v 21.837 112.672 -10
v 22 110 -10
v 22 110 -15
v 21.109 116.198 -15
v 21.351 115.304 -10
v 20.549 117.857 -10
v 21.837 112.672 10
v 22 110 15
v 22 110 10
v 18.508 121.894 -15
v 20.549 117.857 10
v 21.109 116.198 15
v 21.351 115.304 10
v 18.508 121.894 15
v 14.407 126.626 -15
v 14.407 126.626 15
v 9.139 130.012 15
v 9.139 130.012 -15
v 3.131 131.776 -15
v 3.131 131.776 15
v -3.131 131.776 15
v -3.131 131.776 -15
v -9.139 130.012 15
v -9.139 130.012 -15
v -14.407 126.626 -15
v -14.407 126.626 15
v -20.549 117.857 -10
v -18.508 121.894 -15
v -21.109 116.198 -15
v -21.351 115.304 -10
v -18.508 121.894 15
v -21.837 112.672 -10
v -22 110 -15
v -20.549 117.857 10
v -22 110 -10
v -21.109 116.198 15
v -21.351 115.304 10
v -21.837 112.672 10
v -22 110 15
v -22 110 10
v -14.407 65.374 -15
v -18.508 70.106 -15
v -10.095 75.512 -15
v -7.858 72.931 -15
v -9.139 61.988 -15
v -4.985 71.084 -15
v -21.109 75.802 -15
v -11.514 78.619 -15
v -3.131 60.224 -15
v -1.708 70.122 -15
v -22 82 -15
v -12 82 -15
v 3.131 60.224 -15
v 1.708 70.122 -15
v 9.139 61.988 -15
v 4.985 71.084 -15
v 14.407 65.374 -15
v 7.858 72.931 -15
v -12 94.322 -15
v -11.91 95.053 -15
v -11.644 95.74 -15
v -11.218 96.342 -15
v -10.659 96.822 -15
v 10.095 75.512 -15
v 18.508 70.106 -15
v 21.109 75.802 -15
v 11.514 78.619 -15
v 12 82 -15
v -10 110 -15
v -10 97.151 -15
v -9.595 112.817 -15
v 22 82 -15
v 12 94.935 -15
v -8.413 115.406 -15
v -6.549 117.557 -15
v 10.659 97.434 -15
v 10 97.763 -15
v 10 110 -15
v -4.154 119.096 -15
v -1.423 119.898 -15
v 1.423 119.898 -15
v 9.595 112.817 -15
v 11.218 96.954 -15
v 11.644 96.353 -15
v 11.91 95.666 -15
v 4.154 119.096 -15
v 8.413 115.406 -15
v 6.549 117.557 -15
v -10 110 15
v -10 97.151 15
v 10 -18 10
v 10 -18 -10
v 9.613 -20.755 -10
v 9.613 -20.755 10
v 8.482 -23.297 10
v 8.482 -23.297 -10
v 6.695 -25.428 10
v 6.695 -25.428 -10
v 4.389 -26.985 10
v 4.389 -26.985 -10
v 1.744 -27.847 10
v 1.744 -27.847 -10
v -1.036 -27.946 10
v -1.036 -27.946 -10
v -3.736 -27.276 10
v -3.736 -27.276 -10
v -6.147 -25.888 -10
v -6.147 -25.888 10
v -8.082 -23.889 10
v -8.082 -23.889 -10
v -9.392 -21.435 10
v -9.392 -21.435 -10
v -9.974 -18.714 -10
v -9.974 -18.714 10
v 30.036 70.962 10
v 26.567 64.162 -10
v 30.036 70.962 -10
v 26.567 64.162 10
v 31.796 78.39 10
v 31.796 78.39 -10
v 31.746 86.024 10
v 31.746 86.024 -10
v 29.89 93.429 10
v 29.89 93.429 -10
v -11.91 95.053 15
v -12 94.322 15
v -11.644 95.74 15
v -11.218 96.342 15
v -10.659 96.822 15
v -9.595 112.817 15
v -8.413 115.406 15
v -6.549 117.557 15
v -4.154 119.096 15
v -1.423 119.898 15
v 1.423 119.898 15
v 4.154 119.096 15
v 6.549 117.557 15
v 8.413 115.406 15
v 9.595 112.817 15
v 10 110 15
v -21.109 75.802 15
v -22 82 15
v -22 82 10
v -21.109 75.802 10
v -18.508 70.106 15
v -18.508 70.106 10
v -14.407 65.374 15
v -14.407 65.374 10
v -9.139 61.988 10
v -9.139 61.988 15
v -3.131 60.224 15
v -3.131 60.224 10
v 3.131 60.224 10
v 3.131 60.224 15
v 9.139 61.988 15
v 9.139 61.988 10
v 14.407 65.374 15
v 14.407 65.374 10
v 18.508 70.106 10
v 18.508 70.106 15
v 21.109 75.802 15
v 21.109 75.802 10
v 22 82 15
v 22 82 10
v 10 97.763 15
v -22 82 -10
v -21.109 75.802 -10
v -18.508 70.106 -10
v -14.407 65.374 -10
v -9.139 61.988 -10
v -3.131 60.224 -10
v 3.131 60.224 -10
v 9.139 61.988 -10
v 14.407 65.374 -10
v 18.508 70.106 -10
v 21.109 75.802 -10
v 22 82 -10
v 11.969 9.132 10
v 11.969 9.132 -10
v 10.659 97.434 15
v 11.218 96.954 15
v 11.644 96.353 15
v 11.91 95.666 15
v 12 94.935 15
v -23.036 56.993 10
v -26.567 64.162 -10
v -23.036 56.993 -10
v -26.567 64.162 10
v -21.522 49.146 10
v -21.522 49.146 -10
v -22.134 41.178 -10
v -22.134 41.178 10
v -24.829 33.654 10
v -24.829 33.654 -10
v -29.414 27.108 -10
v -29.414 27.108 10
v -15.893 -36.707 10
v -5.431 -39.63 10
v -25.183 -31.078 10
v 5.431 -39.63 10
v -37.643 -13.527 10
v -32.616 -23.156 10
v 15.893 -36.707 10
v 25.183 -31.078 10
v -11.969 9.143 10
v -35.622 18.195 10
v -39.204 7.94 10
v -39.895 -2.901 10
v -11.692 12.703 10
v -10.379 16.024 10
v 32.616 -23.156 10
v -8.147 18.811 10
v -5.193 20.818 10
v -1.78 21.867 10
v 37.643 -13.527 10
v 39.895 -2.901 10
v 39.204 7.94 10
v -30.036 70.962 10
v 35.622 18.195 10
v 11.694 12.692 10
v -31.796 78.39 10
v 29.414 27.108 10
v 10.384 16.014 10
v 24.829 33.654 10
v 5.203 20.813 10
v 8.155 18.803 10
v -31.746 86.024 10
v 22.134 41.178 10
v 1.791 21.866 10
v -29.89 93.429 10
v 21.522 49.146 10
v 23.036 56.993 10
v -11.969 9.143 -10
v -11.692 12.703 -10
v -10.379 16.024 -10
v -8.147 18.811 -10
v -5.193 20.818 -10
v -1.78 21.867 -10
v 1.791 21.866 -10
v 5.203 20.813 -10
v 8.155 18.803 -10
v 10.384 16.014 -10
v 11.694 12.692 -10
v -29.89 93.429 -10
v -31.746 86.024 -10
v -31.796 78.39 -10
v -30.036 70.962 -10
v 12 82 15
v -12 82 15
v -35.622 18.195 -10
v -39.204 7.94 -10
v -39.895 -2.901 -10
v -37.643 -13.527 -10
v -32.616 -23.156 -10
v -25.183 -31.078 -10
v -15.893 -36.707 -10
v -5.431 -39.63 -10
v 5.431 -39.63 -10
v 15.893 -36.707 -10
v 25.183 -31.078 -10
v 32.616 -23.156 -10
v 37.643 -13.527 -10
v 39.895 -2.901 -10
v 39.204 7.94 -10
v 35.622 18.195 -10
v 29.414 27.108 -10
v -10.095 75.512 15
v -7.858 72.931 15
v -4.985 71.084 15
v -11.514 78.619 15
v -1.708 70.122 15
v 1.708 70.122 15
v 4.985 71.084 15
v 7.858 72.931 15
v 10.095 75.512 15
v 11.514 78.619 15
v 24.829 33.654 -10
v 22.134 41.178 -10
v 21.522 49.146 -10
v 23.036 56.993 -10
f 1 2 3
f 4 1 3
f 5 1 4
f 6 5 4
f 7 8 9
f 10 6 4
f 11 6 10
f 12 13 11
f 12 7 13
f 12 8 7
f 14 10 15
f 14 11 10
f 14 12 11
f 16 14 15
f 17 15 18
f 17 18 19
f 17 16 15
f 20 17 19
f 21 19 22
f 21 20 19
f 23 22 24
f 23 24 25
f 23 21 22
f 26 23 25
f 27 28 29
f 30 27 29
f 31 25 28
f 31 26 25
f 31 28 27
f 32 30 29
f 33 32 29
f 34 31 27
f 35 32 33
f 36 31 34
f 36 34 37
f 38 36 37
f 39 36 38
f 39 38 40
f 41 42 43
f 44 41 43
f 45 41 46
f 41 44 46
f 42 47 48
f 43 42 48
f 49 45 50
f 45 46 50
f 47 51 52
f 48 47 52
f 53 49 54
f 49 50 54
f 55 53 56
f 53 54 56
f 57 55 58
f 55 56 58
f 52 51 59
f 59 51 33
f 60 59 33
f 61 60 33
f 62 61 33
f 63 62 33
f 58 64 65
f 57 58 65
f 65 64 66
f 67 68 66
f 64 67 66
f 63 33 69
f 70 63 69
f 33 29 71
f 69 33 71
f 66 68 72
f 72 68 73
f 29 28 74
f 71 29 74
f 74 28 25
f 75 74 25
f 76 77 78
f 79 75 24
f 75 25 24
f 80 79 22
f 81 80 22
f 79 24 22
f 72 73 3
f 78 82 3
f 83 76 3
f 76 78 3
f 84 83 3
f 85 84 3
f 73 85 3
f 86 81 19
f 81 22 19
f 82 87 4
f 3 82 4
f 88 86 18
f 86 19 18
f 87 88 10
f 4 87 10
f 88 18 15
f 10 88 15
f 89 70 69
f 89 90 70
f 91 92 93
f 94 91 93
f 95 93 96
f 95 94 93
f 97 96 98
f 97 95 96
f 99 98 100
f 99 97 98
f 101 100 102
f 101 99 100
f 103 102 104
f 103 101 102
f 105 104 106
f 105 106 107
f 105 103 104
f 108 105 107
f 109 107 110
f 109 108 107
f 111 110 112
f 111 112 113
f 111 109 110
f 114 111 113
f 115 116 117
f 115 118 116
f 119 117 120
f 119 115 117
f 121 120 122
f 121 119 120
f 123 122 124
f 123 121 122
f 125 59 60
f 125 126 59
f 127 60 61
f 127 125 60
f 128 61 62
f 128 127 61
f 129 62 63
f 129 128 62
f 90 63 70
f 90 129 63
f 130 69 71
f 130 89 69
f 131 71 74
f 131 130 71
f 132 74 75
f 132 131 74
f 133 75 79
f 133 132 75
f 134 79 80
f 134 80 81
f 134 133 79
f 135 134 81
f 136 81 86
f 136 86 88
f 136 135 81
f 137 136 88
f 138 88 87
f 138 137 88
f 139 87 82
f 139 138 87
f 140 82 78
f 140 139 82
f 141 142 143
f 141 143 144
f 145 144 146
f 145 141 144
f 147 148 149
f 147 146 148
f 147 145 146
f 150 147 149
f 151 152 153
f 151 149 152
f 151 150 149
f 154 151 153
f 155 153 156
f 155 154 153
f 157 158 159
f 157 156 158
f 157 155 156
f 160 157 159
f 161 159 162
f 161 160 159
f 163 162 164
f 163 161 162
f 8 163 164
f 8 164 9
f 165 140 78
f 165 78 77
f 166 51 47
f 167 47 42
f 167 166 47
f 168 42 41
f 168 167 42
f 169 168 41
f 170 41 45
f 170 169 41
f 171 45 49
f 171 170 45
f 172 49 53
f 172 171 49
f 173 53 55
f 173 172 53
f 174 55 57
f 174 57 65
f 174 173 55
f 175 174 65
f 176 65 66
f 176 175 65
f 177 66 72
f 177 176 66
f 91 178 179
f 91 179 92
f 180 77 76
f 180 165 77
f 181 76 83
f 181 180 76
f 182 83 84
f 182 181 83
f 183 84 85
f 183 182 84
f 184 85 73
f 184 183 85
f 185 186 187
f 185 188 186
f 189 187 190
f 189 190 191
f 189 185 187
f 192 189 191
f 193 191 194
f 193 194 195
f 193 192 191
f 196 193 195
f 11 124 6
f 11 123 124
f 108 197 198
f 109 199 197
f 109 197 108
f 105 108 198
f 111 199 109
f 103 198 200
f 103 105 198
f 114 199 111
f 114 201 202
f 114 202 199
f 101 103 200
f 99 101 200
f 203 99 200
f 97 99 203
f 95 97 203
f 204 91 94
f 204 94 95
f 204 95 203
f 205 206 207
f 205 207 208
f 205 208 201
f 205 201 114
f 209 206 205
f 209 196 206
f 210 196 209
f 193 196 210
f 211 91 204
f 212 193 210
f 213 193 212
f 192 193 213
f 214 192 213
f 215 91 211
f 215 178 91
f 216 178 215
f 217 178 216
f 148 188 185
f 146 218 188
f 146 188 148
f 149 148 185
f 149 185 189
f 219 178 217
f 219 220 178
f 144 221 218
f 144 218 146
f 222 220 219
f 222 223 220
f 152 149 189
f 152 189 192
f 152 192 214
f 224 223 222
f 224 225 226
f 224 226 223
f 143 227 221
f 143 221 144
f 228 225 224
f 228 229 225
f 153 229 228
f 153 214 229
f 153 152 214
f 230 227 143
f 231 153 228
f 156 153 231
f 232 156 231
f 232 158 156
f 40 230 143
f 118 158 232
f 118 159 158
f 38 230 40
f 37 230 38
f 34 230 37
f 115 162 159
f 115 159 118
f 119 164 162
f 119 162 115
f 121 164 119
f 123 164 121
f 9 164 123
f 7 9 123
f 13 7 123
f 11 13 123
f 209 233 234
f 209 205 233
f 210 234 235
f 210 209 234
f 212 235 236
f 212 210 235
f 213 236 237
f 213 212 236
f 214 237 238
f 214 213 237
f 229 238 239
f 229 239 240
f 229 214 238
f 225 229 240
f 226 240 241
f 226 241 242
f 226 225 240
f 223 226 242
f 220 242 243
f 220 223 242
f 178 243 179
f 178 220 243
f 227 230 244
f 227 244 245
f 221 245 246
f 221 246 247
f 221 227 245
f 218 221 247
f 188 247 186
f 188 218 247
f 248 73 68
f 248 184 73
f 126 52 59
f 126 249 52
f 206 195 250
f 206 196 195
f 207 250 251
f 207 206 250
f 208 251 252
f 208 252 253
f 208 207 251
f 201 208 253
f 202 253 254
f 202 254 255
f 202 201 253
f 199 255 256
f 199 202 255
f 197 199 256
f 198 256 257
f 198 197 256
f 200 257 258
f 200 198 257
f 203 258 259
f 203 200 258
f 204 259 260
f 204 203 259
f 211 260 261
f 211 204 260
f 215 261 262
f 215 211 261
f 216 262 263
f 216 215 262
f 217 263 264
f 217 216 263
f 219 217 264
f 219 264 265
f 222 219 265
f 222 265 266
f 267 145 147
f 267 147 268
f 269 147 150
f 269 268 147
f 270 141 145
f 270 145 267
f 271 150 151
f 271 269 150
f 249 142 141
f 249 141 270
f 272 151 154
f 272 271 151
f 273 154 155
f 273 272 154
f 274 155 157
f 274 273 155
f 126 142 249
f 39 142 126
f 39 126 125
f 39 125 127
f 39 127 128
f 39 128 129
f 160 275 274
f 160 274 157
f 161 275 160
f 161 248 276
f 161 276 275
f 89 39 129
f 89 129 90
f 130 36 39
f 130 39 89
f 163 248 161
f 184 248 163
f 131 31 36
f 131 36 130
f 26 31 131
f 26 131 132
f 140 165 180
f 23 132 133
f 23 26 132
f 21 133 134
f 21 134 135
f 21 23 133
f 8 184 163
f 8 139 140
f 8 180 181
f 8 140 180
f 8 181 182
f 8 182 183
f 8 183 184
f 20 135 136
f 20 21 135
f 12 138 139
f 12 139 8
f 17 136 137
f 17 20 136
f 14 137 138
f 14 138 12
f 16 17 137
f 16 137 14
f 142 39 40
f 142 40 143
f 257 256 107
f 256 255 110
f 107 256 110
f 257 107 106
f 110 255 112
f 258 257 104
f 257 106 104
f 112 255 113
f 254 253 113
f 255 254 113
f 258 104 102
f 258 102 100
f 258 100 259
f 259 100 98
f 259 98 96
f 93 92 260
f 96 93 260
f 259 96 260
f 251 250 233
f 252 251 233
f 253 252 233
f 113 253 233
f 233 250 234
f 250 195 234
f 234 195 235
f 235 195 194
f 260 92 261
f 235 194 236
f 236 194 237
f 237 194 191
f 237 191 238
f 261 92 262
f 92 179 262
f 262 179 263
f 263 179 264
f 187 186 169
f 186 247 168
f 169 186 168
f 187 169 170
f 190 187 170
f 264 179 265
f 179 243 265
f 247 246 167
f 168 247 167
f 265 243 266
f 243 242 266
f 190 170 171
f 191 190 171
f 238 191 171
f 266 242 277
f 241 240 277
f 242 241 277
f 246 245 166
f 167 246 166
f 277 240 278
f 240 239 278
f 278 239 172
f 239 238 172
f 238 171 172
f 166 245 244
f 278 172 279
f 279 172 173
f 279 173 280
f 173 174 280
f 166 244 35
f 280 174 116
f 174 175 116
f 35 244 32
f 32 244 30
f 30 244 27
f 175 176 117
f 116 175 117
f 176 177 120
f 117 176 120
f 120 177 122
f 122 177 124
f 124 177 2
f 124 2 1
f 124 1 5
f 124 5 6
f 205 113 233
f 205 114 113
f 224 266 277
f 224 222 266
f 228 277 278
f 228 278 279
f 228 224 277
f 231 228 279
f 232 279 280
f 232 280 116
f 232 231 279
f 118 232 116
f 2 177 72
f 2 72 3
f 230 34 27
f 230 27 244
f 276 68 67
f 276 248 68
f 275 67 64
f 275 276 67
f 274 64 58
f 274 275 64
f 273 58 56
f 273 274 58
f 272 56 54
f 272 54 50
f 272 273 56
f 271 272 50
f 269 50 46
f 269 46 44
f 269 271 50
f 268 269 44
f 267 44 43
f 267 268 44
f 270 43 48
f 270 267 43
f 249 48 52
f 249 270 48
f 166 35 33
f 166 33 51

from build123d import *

# Parameters (mm, degrees)
BOSS_EXTRUDE1_DEPTH = 15
BOSS_EXTRUDE3_DEPTH = 10


with BuildPart() as part:
    # Sketch1 → Boss-Extrude1 (new, symmetric)
    with BuildSketch(Plane.XY):
        with BuildLine():
            Line((22, 82), (22, 110))
            ThreePointArc((22, 110), (21.634233178, 113.994991212), (20.54909502, 117.857142857))
            ThreePointArc((20.54909502, 117.857142857), (0, 132), (-20.54909502, 117.857142857))
            ThreePointArc((-20.54909502, 117.857142857), (-21.634233178, 113.994991212), (-22, 110))
            Line((-22, 110), (-22, 82))
            ThreePointArc((-22, 82), (0, 60), (22, 82))
        make_face()
        with BuildLine():
            ThreePointArc((-10, 110), (0, 120), (10, 110))
            Line((10, 110), (10, 97.763084363))
            ThreePointArc((10, 97.763084363), (11.449489743, 96.666708046), (12, 94.934657238))
            Line((12, 94.934657238), (12, 82))
            ThreePointArc((12, 82), (0, 70), (-12, 82))
            Line((-12, 82), (-12, 94.322221654))
            ThreePointArc((-12, 94.322221654), (-11.449489743, 96.054272461), (-10, 97.150648779))
            Line((-10, 97.150648779), (-10, 110))
        make_face(mode=Mode.SUBTRACT)
    extrude(amount=BOSS_EXTRUDE1_DEPTH, both=True)

    # Sketch1<4> → Boss-Extrude3 (add, symmetric)
    with BuildSketch(Plane.XY):
        with BuildLine():
            ThreePointArc((20.54909502, 117.857142857), (21.634233178, 113.994991212), (22, 110))
            Line((22, 110), (22, 82))
            ThreePointArc((22, 82), (0, 60), (-22, 82))
            Line((-22, 82), (-22, 110))
            ThreePointArc((-22, 110), (-21.634233178, 113.994991212), (-20.54909502, 117.857142857))
            Line((-20.54909502, 117.857142857), (-29.889592756, 93.428571429))
            ThreePointArc((-29.889592756, 93.428571429), (-31.795758241, 78.390324411), (-26.567056796, 64.162077105))
            ThreePointArc((-26.567056796, 64.162077105), (-21.561800954, 45.141212789), (-29.413527167, 27.108013937))
            ThreePointArc((-29.413527167, 27.108013937), (0, -40), (29.413527167, 27.108013937))
            ThreePointArc((29.413527167, 27.108013937), (21.561800954, 45.141212789), (26.567056796, 64.162077105))
            ThreePointArc((26.567056796, 64.162077105), (31.795758241, 78.390324411), (29.889592756, 93.428571429))
            Line((29.889592756, 93.428571429), (20.54909502, 117.857142857))
        make_face()
        with BuildLine():
            Line((11.968538667, 9.131620953), (10, -18))
            ThreePointArc((10, -18), (0.357371137, -27.993612253), (-9.974457174, -18.714285714))
            Line((-9.974457174, -18.714285714), (-11.969348609, 9.142857143))
            ThreePointArc((-11.969348609, 9.142857143), (0.005632672, 21.999998678), (11.968538667, 9.131620953))
        make_face(mode=Mode.SUBTRACT)
    extrude(amount=BOSS_EXTRUDE3_DEPTH, both=True)


solid = part.part
